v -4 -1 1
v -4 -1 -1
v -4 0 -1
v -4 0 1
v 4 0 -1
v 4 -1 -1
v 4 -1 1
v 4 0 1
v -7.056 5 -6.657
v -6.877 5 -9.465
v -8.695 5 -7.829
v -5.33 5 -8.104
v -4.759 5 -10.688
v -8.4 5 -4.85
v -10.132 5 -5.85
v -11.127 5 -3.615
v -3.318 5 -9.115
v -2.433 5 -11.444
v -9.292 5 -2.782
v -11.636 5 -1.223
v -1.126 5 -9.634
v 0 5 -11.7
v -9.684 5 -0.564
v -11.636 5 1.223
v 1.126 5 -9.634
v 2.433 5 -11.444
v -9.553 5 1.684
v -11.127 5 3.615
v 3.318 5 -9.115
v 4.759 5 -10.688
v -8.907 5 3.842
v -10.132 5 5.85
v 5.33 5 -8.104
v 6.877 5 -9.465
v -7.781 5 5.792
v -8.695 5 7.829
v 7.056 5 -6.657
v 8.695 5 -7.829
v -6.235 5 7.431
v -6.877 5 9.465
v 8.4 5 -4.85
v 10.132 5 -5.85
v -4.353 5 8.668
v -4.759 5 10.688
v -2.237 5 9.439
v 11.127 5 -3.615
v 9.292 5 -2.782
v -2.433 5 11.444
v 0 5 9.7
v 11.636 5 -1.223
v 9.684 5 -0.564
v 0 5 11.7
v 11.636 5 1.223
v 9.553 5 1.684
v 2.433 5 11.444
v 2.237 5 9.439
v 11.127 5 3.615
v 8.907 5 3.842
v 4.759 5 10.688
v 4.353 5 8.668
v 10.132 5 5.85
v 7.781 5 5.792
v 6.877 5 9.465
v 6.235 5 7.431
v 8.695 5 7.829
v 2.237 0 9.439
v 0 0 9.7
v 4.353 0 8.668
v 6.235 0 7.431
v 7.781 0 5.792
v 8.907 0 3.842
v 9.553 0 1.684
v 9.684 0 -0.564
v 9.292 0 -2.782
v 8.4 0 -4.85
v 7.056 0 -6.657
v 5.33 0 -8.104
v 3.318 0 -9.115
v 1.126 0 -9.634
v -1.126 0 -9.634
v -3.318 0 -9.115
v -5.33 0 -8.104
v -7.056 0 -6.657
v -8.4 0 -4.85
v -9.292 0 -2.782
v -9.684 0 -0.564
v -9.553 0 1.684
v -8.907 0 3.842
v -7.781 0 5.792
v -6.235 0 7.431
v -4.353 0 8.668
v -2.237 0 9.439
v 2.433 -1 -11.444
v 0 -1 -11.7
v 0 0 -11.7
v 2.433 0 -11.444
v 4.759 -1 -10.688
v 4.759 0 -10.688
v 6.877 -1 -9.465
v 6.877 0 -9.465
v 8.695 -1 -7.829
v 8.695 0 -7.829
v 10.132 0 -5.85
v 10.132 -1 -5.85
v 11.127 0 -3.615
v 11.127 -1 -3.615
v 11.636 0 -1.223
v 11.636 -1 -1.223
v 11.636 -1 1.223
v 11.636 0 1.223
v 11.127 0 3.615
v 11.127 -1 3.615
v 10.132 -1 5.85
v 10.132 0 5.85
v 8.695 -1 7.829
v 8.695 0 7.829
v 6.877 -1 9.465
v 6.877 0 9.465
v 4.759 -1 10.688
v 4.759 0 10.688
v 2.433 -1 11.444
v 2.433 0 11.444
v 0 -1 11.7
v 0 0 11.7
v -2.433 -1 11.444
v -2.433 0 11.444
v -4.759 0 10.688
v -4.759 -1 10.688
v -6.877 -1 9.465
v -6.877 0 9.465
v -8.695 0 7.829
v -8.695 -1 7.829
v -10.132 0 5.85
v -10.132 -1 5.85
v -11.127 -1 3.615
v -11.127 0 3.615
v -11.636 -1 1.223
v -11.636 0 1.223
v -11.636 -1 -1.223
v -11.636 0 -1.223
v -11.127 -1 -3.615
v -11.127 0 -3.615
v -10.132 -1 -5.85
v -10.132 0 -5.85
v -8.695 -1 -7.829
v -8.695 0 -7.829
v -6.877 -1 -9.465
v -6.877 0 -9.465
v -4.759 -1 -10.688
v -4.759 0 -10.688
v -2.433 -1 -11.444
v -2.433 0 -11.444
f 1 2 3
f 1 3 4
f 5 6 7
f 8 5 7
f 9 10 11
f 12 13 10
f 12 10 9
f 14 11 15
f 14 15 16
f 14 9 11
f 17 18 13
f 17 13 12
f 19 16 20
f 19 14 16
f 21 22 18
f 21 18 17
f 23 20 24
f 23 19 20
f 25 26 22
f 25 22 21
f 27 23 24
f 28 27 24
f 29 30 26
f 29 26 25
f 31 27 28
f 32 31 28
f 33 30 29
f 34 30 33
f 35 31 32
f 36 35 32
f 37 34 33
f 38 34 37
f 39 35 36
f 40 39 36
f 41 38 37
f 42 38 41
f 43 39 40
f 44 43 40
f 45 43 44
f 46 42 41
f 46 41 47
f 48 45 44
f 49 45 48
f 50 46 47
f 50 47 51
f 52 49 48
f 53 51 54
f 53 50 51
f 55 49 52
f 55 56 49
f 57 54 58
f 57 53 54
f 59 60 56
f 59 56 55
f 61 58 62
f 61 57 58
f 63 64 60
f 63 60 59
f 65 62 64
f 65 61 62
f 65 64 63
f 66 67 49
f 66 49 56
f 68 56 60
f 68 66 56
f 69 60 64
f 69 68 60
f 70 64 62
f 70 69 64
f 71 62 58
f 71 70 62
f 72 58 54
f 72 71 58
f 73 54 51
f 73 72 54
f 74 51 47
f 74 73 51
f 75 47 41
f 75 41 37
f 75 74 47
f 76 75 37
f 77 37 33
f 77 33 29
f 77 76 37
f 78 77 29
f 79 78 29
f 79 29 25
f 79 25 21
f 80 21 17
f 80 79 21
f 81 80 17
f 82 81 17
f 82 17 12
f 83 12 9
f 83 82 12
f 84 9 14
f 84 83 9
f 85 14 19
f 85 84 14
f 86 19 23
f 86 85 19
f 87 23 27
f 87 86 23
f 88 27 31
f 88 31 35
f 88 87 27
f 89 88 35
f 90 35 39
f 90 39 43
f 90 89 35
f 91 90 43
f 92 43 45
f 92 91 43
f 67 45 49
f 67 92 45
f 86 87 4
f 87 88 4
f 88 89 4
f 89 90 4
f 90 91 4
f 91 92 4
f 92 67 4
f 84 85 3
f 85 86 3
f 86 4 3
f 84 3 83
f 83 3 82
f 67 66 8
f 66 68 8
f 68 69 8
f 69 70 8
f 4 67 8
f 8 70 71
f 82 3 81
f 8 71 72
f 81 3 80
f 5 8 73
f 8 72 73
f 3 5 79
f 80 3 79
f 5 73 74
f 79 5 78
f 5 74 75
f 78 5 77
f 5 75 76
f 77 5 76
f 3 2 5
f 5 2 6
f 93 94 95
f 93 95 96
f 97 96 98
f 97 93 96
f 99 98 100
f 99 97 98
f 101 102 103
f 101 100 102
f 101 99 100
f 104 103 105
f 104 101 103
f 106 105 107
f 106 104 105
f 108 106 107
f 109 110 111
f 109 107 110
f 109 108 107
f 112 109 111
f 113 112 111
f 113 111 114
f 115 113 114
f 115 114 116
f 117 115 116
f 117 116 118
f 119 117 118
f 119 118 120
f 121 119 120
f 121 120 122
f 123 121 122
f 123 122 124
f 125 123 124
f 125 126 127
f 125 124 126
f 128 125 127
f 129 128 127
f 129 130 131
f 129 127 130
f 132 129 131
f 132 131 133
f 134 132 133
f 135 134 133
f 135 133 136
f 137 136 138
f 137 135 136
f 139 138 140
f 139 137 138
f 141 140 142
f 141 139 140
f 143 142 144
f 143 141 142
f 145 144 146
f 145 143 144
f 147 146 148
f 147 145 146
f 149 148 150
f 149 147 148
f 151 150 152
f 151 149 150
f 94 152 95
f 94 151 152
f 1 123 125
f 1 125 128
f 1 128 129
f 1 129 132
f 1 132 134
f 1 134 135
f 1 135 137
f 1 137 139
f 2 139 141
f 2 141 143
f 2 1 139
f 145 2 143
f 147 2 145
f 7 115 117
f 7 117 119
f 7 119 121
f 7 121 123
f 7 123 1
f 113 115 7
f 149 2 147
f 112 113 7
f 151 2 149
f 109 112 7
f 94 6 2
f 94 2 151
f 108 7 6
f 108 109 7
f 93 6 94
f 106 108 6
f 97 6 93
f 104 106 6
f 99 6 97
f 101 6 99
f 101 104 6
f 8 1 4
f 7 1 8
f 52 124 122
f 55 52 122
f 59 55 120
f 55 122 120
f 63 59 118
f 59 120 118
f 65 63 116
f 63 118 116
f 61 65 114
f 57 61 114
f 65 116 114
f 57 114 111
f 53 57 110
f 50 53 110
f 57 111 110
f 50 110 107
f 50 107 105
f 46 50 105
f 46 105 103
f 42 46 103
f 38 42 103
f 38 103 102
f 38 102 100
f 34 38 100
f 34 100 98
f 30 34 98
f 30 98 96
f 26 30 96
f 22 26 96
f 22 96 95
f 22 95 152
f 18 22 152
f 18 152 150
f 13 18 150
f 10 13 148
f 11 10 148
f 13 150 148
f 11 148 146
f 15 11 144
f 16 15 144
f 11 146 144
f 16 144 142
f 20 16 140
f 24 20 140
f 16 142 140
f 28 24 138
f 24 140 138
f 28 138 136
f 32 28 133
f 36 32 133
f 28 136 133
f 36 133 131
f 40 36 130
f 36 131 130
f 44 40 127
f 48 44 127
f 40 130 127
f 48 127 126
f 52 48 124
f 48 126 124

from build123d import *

# Parameters (mm, degrees)
SKETCH1_R           = 11.7
SKETCH1_R_2         = 9.7
BOSS_EXTRUDE1_DEPTH = 5
BOSS_EXTRUDE2_START = 1
SKETCH2_R           = 11.7
BOSS_EXTRUDE2_DEPTH = 1
SKETCH3_W           = 8
SKETCH3_H           = 2
CUT_EXTRUDE1_DEPTH  = 7


with BuildPart() as part:
    # Sketch1 → Boss-Extrude1 (new body)
    with BuildSketch(Plane(origin=(0, 0, 0), x_dir=(1, 0, 0), z_dir=(0, 1, 0))):
        with Locations(Location((0, 0, 0), (0, 0, 270))):
            Circle(SKETCH1_R)
        with Locations(Location((0, 0, 0), (0, 0, 270))):
            Circle(SKETCH1_R_2, mode=Mode.SUBTRACT)
    extrude(amount=BOSS_EXTRUDE1_DEPTH)

    # Sketch2 → Boss-Extrude2 (add)
    with BuildSketch(Plane.XZ.offset(BOSS_EXTRUDE2_START)):
        with Locations(Location((0, 0, 0), (0, 0, 270))):
            Circle(SKETCH2_R)
    extrude(amount=-BOSS_EXTRUDE2_DEPTH)

    # Sketch3 → Cut-Extrude1 (cut)
    with BuildSketch(Plane.XZ.offset(1)):
        Rectangle(SKETCH3_W, SKETCH3_H)
    extrude(amount=-CUT_EXTRUDE1_DEPTH, mode=Mode.SUBTRACT)


solid = part.part
